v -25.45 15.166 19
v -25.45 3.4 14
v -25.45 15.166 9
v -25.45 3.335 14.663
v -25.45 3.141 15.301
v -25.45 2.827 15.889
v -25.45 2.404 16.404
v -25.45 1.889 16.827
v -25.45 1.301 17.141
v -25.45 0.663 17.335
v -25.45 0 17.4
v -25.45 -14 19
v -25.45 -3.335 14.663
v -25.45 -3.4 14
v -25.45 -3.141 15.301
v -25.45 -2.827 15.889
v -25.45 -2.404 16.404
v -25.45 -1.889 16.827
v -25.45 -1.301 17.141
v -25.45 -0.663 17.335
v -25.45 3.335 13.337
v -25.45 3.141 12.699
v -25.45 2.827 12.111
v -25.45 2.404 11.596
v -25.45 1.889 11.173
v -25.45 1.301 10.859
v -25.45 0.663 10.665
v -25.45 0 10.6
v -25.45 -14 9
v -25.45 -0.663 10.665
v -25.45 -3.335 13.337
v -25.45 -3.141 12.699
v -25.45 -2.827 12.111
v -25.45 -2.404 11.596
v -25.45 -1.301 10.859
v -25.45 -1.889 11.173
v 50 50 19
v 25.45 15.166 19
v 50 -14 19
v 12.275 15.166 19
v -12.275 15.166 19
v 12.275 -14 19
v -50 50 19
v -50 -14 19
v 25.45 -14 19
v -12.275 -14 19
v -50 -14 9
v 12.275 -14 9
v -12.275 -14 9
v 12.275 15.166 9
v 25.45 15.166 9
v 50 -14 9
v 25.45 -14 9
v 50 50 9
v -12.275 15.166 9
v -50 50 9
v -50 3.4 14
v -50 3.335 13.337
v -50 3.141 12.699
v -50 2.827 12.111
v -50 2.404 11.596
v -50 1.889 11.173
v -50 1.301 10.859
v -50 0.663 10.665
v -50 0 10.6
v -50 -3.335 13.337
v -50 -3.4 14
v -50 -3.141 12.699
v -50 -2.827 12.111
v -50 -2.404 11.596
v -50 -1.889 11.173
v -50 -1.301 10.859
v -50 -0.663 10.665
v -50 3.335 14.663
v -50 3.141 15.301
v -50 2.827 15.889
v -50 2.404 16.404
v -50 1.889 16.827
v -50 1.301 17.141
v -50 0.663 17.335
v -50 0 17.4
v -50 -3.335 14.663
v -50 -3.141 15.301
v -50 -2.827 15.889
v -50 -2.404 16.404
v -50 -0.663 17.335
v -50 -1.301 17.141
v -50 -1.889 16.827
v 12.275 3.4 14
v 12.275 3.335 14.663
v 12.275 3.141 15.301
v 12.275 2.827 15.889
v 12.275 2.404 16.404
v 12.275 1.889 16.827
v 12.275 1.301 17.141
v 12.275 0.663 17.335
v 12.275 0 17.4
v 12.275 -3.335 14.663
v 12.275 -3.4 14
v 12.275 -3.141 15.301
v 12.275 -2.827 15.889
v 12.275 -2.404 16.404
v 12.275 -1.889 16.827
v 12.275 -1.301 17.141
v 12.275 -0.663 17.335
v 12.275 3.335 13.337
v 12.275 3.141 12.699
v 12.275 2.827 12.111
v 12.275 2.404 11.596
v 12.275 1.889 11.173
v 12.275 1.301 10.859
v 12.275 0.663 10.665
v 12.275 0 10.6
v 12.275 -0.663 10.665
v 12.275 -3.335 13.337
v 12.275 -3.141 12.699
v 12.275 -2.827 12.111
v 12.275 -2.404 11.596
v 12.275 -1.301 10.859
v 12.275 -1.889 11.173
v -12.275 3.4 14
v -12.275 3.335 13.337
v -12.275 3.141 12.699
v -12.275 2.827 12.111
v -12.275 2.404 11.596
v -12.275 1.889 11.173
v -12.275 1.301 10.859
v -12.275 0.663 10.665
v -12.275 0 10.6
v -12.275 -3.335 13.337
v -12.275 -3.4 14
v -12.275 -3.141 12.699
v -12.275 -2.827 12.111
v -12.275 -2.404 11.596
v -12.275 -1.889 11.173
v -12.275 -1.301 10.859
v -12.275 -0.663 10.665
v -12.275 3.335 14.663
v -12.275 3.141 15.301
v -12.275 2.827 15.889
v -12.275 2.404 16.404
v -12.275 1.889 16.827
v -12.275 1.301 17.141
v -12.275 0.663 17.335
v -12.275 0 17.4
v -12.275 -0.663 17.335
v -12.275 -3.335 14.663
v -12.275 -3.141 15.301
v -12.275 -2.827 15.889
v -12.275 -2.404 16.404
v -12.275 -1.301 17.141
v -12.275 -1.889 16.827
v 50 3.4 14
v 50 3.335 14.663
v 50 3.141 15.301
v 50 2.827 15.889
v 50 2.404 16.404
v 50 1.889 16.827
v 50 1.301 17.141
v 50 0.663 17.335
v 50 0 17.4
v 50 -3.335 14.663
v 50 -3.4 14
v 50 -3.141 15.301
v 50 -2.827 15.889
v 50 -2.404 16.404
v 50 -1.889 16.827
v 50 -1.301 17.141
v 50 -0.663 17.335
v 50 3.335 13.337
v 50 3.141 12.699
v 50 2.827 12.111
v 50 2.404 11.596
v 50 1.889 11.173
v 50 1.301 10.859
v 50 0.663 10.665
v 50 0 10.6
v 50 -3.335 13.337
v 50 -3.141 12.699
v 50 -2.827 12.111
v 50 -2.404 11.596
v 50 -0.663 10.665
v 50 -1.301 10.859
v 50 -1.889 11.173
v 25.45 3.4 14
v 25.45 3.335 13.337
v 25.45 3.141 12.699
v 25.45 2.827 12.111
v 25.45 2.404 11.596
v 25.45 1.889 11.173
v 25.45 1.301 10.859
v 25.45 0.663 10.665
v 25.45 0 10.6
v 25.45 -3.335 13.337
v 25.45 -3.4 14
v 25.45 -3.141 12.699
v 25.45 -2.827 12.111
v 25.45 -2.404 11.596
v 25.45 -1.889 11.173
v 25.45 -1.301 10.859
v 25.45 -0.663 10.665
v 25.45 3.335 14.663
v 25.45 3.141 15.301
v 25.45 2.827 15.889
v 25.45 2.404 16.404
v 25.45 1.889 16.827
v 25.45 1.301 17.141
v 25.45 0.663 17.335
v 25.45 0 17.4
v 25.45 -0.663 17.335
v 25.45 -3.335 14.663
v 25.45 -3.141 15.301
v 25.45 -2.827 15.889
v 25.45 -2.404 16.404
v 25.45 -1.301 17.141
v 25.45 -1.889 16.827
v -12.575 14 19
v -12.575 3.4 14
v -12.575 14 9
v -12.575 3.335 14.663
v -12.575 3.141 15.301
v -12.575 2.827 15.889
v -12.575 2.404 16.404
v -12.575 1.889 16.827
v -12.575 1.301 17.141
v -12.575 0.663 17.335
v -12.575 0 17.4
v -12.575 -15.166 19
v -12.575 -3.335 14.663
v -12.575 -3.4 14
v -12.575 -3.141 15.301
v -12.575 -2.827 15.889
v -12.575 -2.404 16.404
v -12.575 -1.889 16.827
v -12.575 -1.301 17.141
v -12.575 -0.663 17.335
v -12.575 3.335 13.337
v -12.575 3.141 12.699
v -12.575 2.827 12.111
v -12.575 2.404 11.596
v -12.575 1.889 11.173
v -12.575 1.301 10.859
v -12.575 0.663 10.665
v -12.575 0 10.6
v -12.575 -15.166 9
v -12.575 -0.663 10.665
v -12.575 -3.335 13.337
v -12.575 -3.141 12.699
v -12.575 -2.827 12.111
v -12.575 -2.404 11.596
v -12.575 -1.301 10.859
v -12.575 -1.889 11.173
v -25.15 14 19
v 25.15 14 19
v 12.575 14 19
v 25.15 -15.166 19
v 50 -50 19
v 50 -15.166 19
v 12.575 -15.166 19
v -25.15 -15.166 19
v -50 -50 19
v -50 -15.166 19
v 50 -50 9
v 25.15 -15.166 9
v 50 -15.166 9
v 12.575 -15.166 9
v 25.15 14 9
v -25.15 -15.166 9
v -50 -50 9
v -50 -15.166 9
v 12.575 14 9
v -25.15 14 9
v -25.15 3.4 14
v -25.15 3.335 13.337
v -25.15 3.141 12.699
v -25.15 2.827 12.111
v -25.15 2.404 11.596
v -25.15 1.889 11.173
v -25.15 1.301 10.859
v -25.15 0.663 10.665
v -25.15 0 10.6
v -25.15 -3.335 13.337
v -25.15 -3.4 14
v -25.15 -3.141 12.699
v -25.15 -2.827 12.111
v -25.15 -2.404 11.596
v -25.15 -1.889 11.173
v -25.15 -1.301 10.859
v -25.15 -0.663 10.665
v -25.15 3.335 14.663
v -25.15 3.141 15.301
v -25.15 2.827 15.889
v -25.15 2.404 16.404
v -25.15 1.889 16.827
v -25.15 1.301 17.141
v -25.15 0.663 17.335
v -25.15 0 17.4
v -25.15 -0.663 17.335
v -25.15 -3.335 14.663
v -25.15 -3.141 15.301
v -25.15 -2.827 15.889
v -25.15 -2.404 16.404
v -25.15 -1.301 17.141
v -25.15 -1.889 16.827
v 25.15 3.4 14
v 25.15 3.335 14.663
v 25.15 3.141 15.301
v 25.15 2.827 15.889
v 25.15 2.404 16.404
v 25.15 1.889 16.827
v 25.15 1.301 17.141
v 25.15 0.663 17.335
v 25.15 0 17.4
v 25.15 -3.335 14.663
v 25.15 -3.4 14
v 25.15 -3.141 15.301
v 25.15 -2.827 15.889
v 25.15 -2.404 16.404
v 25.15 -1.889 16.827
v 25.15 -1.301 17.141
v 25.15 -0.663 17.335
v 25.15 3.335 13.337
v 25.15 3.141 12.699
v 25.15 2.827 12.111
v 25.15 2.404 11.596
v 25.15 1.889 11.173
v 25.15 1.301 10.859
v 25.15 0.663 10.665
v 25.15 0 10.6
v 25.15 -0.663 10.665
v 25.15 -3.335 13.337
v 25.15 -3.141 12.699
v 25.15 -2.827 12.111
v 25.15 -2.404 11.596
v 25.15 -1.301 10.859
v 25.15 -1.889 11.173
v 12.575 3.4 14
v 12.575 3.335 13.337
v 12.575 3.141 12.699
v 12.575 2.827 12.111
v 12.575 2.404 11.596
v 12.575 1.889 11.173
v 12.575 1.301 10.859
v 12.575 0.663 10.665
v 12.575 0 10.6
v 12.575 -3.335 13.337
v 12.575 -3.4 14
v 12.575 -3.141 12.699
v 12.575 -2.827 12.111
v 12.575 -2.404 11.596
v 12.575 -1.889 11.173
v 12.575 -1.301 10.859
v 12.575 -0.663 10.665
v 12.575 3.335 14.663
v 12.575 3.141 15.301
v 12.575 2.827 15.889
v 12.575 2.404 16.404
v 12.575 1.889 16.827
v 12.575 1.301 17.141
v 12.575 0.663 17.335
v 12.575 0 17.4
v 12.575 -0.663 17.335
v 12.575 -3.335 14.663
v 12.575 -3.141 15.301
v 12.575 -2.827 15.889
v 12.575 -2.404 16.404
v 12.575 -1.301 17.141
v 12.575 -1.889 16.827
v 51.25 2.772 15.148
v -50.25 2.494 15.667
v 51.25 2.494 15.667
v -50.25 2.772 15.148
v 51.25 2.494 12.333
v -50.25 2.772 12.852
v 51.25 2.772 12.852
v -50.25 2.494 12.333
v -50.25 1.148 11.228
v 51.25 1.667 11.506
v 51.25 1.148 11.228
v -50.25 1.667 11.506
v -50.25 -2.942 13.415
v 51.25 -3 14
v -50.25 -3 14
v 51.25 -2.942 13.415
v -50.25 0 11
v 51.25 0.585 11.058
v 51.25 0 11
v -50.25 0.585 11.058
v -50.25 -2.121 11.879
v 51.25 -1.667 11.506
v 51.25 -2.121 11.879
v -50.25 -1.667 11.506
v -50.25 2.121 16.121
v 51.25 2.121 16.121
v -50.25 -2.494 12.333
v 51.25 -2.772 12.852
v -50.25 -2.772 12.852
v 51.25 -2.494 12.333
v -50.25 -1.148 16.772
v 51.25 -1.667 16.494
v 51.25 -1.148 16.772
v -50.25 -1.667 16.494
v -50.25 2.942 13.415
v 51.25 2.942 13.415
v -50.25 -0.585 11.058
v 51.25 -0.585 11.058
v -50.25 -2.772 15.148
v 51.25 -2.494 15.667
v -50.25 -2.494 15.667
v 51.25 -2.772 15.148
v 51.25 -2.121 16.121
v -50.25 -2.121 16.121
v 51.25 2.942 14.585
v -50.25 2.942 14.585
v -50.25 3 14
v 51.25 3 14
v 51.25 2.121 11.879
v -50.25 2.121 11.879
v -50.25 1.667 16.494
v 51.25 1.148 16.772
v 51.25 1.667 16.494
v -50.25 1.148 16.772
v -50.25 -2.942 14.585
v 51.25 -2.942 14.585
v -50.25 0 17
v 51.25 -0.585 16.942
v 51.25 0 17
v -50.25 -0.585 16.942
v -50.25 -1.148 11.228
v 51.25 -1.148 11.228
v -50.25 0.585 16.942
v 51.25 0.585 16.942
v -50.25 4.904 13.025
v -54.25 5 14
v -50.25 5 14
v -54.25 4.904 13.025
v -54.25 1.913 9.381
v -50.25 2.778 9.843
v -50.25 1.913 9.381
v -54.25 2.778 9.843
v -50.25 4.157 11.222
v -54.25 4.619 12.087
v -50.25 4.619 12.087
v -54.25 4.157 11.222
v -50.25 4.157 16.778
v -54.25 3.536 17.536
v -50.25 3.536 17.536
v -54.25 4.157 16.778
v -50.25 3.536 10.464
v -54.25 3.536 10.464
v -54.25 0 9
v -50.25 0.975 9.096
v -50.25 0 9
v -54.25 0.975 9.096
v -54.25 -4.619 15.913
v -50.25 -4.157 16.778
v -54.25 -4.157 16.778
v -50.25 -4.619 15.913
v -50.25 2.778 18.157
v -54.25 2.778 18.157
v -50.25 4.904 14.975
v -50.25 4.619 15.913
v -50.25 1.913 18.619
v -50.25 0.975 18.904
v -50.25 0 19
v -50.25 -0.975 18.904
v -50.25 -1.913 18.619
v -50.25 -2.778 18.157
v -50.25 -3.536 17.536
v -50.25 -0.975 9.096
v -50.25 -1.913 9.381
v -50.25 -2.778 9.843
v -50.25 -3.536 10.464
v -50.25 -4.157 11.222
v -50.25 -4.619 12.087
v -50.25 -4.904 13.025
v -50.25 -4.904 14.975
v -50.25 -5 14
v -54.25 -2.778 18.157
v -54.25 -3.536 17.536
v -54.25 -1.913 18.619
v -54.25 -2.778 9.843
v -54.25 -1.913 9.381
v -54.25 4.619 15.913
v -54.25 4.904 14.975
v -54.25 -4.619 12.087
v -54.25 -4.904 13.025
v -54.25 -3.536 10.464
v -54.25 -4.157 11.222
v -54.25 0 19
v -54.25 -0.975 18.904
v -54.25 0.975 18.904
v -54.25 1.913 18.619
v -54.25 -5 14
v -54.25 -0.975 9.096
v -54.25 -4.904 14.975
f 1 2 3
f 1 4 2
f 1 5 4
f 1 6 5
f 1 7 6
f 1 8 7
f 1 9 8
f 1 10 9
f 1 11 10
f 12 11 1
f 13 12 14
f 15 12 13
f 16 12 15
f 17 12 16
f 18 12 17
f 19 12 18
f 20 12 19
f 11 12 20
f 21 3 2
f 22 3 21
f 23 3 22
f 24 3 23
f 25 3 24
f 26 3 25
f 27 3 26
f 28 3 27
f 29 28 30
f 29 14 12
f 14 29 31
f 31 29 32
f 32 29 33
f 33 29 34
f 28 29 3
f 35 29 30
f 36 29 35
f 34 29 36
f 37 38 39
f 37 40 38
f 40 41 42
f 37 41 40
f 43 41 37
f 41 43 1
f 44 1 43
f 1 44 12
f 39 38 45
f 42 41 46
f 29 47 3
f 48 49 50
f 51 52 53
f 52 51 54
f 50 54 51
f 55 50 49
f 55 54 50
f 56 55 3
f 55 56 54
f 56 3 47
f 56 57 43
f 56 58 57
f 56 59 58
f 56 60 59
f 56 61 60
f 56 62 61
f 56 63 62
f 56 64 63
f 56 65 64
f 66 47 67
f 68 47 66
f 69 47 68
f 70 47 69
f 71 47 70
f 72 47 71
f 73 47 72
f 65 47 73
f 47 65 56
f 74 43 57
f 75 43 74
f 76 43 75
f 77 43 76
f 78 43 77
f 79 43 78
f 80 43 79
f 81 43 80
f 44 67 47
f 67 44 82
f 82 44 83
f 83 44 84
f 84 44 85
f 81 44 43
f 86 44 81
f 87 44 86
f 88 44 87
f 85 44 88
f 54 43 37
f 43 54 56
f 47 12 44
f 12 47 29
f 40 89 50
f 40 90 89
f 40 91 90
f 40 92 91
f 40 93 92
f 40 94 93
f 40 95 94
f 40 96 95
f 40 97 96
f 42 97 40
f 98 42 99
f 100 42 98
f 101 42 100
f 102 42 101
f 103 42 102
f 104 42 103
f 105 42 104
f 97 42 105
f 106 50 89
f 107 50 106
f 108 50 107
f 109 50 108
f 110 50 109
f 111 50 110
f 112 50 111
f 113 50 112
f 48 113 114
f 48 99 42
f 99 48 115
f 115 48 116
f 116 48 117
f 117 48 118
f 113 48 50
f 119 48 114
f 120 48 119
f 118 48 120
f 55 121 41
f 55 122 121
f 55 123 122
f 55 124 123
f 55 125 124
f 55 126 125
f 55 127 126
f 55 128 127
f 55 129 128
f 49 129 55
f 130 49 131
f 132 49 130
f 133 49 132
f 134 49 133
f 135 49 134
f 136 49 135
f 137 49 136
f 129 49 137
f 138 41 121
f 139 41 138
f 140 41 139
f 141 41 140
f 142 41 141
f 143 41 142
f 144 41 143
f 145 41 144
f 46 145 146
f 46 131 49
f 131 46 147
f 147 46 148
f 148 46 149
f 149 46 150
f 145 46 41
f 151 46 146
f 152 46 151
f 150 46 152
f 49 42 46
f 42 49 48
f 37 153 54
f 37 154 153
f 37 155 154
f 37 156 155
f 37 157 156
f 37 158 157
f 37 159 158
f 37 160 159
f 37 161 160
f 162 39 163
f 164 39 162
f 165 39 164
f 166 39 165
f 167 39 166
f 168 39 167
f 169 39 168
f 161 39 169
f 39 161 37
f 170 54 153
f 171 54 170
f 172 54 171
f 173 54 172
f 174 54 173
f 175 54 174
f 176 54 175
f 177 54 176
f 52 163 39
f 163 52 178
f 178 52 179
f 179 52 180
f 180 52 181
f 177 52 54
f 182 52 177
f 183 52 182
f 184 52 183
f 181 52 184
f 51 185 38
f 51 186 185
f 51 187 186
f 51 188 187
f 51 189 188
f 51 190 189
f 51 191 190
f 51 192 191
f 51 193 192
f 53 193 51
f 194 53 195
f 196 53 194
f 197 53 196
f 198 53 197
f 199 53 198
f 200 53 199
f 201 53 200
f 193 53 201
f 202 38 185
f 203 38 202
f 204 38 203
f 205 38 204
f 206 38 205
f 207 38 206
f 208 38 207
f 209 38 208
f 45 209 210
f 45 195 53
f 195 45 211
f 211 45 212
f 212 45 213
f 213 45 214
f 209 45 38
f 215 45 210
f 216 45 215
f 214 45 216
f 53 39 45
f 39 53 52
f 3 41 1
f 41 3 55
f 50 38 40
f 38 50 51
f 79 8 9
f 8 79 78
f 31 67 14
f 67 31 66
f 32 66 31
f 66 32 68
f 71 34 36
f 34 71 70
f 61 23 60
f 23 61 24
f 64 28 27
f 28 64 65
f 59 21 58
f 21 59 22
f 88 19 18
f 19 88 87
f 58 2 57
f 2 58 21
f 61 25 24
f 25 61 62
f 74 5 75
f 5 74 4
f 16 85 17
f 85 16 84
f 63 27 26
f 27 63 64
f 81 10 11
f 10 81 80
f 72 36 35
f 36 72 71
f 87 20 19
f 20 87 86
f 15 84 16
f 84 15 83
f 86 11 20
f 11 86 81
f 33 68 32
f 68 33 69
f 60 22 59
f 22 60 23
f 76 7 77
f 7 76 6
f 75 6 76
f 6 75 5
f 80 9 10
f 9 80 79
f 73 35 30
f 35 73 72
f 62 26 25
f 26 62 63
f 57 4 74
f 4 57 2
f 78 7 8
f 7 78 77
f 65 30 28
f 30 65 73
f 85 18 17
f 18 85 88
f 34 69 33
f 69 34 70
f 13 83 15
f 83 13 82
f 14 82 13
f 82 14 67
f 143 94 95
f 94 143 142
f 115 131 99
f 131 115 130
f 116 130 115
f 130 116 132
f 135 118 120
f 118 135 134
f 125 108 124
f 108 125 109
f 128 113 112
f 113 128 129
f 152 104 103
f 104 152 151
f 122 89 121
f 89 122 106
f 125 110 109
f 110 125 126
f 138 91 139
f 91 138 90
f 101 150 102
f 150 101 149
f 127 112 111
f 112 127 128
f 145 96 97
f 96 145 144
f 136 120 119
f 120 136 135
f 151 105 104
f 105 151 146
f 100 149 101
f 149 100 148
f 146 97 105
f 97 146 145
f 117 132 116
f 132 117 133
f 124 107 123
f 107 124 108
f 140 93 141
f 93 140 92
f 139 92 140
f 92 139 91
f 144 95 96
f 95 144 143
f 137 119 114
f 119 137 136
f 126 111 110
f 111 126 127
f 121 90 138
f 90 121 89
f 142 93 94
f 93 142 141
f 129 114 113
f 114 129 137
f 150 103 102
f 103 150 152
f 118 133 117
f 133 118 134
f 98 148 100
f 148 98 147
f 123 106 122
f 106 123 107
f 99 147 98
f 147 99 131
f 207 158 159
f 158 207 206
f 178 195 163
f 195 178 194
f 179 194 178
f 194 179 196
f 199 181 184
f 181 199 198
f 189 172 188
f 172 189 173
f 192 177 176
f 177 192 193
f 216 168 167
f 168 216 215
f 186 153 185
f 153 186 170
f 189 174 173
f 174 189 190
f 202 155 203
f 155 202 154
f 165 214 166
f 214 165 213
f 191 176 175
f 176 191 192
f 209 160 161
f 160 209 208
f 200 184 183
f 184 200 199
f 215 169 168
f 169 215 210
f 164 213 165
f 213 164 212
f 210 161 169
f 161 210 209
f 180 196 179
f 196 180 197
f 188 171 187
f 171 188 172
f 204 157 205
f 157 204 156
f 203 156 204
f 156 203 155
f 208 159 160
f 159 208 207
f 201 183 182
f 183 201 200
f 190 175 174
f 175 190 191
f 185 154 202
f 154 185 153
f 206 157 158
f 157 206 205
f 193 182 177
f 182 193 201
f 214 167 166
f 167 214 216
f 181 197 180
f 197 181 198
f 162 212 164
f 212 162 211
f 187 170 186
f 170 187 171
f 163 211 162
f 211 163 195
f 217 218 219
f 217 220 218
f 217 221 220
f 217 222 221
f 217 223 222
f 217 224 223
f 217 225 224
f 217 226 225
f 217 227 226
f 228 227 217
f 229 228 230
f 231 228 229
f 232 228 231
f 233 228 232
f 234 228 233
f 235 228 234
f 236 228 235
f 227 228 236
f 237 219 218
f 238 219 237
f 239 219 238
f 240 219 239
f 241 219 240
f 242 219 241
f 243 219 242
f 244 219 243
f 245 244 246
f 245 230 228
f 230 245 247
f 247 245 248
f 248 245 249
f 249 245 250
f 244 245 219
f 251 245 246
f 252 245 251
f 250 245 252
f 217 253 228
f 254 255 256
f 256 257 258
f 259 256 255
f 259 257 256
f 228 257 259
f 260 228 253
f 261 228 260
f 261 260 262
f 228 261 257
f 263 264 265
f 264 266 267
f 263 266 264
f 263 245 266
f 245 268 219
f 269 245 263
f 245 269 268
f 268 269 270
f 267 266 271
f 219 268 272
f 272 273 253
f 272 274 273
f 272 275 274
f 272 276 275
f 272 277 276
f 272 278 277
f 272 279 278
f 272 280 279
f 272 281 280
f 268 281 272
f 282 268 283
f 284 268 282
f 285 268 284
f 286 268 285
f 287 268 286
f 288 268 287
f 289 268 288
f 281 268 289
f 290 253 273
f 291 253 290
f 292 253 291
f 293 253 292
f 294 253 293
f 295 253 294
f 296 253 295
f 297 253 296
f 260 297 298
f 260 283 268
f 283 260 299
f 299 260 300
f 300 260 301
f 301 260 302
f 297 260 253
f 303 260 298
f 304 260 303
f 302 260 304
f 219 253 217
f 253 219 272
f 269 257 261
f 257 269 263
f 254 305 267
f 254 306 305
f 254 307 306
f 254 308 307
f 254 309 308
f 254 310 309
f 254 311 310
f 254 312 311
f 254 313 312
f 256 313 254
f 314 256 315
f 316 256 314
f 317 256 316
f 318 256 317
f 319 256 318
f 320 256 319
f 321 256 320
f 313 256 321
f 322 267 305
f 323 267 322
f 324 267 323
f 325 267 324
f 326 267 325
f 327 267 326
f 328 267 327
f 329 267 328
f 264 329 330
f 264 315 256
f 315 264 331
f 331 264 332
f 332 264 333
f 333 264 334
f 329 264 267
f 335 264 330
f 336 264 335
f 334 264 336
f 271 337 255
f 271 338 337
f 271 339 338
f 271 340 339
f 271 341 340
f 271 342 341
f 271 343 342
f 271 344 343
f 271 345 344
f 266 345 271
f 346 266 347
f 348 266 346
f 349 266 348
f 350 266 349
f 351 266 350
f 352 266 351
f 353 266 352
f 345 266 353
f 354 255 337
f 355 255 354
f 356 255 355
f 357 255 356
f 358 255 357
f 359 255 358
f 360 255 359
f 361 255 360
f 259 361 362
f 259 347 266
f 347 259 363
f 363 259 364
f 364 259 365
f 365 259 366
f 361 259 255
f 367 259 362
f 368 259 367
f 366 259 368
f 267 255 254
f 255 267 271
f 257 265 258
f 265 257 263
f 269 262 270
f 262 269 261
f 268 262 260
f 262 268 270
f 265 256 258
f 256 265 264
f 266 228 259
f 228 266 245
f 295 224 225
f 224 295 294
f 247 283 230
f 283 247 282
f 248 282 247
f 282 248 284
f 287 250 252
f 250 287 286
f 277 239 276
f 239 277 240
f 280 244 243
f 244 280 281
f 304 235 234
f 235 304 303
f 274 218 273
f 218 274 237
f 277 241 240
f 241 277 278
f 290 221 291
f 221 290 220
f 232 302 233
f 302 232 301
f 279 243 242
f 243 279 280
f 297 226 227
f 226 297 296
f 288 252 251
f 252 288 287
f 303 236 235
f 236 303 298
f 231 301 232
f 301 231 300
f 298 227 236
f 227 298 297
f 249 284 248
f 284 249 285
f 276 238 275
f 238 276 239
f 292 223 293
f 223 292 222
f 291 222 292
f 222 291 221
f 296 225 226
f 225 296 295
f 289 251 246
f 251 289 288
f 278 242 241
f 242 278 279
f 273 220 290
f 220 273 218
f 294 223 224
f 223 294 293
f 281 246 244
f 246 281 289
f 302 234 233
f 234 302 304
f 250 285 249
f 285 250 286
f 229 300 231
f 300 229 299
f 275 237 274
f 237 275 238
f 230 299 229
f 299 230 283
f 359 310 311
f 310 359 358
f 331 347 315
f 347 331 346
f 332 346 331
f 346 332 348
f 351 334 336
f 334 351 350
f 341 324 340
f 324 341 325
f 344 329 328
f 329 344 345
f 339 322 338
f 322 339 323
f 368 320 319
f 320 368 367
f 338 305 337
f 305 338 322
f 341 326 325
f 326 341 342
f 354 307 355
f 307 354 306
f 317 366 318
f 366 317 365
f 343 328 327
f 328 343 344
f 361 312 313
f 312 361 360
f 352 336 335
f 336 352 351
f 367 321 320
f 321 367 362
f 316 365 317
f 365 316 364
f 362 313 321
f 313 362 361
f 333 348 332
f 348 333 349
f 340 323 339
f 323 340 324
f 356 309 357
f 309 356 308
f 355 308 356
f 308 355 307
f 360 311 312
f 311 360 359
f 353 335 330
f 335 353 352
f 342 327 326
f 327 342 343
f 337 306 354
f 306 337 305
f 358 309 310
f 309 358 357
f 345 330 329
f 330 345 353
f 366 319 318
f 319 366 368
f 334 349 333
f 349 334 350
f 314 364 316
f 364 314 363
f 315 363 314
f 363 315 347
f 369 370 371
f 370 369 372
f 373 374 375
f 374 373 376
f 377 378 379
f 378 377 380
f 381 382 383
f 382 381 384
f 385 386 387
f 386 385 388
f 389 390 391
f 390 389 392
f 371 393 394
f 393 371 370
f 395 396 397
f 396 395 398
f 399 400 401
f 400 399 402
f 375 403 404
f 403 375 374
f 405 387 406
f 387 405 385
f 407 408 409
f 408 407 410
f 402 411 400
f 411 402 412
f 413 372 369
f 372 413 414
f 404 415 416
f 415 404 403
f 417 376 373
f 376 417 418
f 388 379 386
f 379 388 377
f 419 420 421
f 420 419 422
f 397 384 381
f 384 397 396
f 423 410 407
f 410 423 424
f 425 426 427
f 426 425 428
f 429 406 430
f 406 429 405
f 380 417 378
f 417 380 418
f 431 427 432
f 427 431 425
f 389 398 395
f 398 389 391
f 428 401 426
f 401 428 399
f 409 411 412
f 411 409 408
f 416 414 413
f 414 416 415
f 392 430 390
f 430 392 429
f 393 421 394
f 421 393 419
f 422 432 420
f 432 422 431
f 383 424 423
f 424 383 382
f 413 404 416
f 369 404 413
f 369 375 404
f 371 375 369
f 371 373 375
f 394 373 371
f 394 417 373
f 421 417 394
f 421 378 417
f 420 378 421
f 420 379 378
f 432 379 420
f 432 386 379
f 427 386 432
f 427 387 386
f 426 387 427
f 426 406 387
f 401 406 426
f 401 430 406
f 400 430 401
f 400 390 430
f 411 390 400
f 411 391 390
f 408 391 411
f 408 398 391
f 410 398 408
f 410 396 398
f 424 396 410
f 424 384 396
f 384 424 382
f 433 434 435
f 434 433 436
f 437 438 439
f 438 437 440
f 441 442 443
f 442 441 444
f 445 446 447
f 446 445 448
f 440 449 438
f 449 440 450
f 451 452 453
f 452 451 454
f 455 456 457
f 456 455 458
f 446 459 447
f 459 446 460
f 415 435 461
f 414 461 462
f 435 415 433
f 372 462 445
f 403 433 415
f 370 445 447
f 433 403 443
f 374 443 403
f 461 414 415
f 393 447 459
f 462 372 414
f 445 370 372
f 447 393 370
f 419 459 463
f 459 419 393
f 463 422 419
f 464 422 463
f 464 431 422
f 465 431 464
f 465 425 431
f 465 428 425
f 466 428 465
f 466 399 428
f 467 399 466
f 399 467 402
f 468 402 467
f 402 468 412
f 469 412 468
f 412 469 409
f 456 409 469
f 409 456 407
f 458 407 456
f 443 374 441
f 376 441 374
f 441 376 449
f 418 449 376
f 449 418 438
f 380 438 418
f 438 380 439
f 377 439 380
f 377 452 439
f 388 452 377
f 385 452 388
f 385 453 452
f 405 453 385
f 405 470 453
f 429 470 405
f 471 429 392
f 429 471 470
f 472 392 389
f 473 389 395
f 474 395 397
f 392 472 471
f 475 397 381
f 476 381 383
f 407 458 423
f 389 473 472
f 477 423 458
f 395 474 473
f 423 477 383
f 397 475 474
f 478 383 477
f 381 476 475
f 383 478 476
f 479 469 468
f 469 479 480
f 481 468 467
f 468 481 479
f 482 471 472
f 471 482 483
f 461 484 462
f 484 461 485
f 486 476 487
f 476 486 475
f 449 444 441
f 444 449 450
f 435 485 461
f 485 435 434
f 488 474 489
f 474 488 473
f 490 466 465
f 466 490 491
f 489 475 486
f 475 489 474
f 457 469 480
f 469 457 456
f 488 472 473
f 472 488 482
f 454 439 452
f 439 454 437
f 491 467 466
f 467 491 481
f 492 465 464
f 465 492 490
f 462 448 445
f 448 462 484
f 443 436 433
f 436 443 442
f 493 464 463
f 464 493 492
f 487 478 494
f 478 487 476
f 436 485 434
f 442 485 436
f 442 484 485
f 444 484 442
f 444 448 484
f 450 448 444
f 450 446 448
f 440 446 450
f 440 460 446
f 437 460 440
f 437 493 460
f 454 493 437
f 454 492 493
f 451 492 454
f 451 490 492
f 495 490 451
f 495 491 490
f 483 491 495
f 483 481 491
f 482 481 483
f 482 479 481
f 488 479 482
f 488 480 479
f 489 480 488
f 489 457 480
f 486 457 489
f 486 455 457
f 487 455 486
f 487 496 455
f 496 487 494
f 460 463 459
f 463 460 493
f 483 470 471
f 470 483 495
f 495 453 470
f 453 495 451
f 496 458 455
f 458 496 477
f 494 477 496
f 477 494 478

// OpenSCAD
$fn = 32;

// ------------------------------------------------------------------------
// Butt hinge: hinge 100 mm, leaf swung 0 deg
// Every part is its own module, assembly() places every instance.
// ------------------------------------------------------------------------

// --- part 1 ---
module hinge_base() {
  difference() {
    union() {
      translate([-50, -14, -5]) cube([24.55, 64, 10]);
      translate([-12.275, -14, -5]) cube([24.55, 64, 10]);
      translate([25.45, -14, -5]) cube([24.55, 64, 10]);
      translate([-50, 15.166, -5]) cube([100, 34.834, 10]);
    }
    translate([-37.725, 0, 0]) rotate([0, 90, 0]) cylinder(h = 26.55, d = 6.8, center = true);
    translate([0, 0, 0]) rotate([0, 90, 0]) cylinder(h = 26.55, d = 6.8, center = true);
    translate([37.725, 0, 0]) rotate([0, 90, 0]) cylinder(h = 26.55, d = 6.8, center = true);
  }
}

// --- part 2 ---
module hinge_mover() {
  difference() {
    union() {
      translate([-25.15, -50, -5]) cube([12.575, 64, 10]);
      translate([12.575, -50, -5]) cube([12.575, 64, 10]);
      translate([-50, -50, -5]) cube([100, 34.834, 10]);
    }
    translate([-18.863, 0, 0]) rotate([0, 90, 0]) cylinder(h = 14.575, d = 6.8, center = true);
    translate([18.863, 0, 0]) rotate([0, 90, 0]) cylinder(h = 14.575, d = 6.8, center = true);
  }
}

// --- part 3 ---
module hinge_pin() {
  rotate([0, 90, 0]) cylinder(h = 102.5, d = 6, center = true);
  translate([-54.25, 0, 0]) rotate([0, 90, 0]) cylinder(h = 4, d = 10);
}

// --- assembly ---
module assembly() {
  color([0.80, 0.24, 0.20]) translate([0, 0, 14]) rotate([0, 0, 0]) hinge_base();
  color([0.20, 0.45, 0.75]) translate([0, 0, 14]) rotate([0, 0, 0]) hinge_mover();
  color([0.25, 0.62, 0.32]) translate([0, 0, 14]) rotate([0, 0, 0]) hinge_pin();
}

assembly();
